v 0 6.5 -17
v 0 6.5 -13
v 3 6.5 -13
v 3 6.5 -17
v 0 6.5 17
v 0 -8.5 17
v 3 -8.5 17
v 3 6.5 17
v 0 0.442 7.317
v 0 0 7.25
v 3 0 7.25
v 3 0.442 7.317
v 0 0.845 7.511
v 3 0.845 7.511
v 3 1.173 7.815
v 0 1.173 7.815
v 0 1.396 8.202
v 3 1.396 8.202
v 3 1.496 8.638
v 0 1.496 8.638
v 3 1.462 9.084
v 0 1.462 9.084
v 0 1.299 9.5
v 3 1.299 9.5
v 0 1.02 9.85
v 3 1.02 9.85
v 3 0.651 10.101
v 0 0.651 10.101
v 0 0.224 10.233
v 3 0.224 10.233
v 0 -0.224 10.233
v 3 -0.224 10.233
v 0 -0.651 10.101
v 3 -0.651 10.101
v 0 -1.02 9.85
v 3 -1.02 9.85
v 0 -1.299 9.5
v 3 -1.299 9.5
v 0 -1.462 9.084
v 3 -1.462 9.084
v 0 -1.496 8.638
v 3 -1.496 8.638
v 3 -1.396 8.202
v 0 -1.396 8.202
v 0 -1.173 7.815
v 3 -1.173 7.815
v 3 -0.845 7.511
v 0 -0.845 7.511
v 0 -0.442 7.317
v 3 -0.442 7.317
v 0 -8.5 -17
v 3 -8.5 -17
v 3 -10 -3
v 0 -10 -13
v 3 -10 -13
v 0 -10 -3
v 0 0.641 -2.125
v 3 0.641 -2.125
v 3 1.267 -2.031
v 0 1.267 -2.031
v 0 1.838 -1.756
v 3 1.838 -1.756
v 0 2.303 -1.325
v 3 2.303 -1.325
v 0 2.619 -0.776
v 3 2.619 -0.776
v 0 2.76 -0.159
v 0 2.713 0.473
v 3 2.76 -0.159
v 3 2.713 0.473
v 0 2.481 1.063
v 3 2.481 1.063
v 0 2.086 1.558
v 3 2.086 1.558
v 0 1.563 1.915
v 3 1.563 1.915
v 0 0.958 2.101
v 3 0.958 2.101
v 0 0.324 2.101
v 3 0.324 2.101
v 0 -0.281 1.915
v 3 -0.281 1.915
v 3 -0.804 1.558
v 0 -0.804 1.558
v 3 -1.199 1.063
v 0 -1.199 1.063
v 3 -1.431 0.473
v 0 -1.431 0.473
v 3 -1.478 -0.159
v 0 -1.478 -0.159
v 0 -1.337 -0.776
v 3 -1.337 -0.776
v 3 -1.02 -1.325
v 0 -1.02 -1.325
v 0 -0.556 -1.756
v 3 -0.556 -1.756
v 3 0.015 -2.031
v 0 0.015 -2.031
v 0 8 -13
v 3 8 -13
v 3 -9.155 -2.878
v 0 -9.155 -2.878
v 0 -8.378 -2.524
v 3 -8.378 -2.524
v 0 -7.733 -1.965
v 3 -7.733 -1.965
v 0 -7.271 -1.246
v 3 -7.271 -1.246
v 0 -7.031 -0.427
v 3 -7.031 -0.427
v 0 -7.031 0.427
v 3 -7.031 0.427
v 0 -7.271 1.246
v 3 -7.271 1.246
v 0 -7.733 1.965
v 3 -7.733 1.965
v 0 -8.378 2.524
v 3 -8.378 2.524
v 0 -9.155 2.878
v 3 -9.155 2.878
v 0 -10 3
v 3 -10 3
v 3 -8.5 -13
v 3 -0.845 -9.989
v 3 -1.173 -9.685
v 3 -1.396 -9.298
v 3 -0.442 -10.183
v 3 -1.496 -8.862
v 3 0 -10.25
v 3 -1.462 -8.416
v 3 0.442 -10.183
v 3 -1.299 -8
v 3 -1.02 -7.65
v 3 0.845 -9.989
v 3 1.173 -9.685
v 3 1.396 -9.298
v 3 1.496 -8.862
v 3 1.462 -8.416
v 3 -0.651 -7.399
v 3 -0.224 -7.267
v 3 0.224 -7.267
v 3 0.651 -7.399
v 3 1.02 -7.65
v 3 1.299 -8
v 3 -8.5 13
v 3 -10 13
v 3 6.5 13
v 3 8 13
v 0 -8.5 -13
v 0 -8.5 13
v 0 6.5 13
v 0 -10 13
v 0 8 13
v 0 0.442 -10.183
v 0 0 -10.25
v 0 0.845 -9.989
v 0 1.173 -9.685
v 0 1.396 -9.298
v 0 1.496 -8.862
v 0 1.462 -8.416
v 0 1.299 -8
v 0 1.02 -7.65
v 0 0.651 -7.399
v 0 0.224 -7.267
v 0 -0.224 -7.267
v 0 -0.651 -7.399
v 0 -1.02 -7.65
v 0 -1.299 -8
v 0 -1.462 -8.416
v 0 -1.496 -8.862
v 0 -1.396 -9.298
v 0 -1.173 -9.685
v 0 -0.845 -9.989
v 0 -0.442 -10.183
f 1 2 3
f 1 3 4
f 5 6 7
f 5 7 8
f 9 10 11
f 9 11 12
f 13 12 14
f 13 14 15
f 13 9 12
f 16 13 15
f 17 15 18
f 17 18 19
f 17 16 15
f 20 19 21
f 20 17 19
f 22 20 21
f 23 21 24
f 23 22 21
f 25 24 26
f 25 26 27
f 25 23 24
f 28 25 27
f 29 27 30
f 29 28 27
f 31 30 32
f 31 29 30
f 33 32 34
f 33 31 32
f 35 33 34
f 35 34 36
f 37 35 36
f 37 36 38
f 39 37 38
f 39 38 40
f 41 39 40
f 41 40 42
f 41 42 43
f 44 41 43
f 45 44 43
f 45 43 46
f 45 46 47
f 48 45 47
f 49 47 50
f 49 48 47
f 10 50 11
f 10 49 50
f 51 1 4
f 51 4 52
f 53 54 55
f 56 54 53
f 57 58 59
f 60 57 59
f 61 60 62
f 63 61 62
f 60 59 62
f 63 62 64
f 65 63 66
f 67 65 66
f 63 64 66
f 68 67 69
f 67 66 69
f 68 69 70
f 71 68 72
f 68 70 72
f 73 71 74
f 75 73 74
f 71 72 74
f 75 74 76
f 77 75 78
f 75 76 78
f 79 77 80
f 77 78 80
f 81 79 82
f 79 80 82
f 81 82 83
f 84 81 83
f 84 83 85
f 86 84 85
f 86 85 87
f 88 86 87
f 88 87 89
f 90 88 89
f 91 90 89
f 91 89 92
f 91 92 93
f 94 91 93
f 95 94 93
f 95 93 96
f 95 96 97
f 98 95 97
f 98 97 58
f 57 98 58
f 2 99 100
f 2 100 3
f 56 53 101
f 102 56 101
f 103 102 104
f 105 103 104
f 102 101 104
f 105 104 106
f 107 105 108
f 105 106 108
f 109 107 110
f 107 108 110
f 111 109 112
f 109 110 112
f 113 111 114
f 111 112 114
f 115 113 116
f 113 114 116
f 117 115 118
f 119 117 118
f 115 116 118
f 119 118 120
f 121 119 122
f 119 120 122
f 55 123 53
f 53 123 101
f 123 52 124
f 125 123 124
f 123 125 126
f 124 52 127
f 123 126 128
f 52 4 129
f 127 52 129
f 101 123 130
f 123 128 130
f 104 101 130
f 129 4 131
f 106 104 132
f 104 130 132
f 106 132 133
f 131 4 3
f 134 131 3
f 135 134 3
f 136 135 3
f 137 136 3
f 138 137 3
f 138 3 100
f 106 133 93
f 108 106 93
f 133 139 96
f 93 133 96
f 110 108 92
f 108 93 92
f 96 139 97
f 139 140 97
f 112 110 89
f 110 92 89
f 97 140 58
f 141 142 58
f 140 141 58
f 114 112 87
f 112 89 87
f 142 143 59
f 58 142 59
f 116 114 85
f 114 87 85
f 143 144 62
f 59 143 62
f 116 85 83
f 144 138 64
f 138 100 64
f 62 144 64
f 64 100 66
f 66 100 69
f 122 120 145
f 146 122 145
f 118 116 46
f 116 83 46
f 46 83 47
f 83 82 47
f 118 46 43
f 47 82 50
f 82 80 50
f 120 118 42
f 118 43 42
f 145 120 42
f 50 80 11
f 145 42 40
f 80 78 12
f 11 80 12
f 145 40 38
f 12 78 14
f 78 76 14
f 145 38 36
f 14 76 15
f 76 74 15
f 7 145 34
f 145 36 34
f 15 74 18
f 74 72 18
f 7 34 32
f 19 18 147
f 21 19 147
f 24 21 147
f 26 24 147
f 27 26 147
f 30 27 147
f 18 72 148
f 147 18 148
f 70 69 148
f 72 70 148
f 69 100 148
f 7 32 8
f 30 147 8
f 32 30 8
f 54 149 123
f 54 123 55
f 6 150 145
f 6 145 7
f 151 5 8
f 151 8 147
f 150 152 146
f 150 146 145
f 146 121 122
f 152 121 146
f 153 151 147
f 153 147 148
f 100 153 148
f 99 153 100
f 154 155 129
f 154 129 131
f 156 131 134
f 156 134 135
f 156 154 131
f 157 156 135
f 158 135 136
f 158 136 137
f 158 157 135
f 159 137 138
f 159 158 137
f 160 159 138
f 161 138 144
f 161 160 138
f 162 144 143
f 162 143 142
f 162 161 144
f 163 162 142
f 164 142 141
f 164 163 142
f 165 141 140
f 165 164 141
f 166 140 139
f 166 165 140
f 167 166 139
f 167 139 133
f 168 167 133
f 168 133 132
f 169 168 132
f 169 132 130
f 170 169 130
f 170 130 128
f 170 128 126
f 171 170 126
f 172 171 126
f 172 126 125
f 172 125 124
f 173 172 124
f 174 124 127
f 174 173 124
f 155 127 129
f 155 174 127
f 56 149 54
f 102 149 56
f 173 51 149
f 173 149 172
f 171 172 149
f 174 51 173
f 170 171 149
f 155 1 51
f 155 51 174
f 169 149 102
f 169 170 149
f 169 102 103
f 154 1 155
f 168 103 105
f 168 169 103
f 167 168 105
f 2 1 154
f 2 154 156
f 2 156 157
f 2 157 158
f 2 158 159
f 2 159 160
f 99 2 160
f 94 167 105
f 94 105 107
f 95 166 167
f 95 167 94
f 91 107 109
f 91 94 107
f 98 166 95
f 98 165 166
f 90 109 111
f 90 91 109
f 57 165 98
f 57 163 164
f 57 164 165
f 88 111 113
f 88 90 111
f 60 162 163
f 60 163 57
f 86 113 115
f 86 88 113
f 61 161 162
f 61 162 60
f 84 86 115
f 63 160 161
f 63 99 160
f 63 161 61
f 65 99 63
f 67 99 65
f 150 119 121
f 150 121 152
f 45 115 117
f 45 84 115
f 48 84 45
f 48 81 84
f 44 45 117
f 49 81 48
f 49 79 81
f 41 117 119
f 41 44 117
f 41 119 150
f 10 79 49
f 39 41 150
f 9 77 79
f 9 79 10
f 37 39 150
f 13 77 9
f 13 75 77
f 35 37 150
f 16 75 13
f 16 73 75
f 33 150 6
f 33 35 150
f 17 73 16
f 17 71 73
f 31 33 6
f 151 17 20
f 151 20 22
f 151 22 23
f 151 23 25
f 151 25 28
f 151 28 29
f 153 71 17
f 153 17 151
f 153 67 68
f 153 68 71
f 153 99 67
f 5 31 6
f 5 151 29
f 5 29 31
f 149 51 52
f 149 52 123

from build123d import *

# Parameters (mm, degrees)
SKETCH1_R           = 1.5
BOSS_EXTRUDE1_DEPTH = 3
CUT_EXTRUDE1_DEPTH  = 3
SKETCH3_R           = 2.125
CUT_EXTRUDE3_DEPTH  = 4


with BuildPart() as part:
    # Sketch1 → Boss-Extrude1 (new body)
    with BuildSketch(Plane(origin=(0, 0, 0), x_dir=(0, 0, -1), z_dir=(1, 0, 0))):
        Polygon((13, 6.5), (17, 6.5), (17, -8.5), (13, -8.5), (13, -10), (-13, -10), (-13, -8.5), (-17, -8.5), (-17, 6.5), (-13, 6.5), (-13, 8), (13, 8), align=None)
        with Locations((-8.75, 0)):
            Circle(SKETCH1_R, mode=Mode.SUBTRACT)
        with Locations((8.75, 0)):
            Circle(SKETCH1_R, mode=Mode.SUBTRACT)
    extrude(amount=BOSS_EXTRUDE1_DEPTH)

    # Sketch2 → Cut-Extrude1 (cut)
    with BuildSketch(Plane(origin=(3, 0, 0), x_dir=(0, 0, -1), z_dir=(1, 0, 0))):
        with BuildLine():
            Line((-3, -10), (3, -10))
            ThreePointArc((3, -10), (0, -7), (-3, -10))
        make_face()
    extrude(amount=-CUT_EXTRUDE1_DEPTH, mode=Mode.SUBTRACT)

    # Sketch3 → Cut-Extrude3 (cut, through all)
    with BuildSketch(Plane(origin=(3, 0, 0), x_dir=(0, 0, -1), z_dir=(1, 0, 0))):
        with Locations((0, 0.641129032)):
            Circle(SKETCH3_R)
    extrude(amount=-CUT_EXTRUDE3_DEPTH, mode=Mode.SUBTRACT)


solid = part.part
